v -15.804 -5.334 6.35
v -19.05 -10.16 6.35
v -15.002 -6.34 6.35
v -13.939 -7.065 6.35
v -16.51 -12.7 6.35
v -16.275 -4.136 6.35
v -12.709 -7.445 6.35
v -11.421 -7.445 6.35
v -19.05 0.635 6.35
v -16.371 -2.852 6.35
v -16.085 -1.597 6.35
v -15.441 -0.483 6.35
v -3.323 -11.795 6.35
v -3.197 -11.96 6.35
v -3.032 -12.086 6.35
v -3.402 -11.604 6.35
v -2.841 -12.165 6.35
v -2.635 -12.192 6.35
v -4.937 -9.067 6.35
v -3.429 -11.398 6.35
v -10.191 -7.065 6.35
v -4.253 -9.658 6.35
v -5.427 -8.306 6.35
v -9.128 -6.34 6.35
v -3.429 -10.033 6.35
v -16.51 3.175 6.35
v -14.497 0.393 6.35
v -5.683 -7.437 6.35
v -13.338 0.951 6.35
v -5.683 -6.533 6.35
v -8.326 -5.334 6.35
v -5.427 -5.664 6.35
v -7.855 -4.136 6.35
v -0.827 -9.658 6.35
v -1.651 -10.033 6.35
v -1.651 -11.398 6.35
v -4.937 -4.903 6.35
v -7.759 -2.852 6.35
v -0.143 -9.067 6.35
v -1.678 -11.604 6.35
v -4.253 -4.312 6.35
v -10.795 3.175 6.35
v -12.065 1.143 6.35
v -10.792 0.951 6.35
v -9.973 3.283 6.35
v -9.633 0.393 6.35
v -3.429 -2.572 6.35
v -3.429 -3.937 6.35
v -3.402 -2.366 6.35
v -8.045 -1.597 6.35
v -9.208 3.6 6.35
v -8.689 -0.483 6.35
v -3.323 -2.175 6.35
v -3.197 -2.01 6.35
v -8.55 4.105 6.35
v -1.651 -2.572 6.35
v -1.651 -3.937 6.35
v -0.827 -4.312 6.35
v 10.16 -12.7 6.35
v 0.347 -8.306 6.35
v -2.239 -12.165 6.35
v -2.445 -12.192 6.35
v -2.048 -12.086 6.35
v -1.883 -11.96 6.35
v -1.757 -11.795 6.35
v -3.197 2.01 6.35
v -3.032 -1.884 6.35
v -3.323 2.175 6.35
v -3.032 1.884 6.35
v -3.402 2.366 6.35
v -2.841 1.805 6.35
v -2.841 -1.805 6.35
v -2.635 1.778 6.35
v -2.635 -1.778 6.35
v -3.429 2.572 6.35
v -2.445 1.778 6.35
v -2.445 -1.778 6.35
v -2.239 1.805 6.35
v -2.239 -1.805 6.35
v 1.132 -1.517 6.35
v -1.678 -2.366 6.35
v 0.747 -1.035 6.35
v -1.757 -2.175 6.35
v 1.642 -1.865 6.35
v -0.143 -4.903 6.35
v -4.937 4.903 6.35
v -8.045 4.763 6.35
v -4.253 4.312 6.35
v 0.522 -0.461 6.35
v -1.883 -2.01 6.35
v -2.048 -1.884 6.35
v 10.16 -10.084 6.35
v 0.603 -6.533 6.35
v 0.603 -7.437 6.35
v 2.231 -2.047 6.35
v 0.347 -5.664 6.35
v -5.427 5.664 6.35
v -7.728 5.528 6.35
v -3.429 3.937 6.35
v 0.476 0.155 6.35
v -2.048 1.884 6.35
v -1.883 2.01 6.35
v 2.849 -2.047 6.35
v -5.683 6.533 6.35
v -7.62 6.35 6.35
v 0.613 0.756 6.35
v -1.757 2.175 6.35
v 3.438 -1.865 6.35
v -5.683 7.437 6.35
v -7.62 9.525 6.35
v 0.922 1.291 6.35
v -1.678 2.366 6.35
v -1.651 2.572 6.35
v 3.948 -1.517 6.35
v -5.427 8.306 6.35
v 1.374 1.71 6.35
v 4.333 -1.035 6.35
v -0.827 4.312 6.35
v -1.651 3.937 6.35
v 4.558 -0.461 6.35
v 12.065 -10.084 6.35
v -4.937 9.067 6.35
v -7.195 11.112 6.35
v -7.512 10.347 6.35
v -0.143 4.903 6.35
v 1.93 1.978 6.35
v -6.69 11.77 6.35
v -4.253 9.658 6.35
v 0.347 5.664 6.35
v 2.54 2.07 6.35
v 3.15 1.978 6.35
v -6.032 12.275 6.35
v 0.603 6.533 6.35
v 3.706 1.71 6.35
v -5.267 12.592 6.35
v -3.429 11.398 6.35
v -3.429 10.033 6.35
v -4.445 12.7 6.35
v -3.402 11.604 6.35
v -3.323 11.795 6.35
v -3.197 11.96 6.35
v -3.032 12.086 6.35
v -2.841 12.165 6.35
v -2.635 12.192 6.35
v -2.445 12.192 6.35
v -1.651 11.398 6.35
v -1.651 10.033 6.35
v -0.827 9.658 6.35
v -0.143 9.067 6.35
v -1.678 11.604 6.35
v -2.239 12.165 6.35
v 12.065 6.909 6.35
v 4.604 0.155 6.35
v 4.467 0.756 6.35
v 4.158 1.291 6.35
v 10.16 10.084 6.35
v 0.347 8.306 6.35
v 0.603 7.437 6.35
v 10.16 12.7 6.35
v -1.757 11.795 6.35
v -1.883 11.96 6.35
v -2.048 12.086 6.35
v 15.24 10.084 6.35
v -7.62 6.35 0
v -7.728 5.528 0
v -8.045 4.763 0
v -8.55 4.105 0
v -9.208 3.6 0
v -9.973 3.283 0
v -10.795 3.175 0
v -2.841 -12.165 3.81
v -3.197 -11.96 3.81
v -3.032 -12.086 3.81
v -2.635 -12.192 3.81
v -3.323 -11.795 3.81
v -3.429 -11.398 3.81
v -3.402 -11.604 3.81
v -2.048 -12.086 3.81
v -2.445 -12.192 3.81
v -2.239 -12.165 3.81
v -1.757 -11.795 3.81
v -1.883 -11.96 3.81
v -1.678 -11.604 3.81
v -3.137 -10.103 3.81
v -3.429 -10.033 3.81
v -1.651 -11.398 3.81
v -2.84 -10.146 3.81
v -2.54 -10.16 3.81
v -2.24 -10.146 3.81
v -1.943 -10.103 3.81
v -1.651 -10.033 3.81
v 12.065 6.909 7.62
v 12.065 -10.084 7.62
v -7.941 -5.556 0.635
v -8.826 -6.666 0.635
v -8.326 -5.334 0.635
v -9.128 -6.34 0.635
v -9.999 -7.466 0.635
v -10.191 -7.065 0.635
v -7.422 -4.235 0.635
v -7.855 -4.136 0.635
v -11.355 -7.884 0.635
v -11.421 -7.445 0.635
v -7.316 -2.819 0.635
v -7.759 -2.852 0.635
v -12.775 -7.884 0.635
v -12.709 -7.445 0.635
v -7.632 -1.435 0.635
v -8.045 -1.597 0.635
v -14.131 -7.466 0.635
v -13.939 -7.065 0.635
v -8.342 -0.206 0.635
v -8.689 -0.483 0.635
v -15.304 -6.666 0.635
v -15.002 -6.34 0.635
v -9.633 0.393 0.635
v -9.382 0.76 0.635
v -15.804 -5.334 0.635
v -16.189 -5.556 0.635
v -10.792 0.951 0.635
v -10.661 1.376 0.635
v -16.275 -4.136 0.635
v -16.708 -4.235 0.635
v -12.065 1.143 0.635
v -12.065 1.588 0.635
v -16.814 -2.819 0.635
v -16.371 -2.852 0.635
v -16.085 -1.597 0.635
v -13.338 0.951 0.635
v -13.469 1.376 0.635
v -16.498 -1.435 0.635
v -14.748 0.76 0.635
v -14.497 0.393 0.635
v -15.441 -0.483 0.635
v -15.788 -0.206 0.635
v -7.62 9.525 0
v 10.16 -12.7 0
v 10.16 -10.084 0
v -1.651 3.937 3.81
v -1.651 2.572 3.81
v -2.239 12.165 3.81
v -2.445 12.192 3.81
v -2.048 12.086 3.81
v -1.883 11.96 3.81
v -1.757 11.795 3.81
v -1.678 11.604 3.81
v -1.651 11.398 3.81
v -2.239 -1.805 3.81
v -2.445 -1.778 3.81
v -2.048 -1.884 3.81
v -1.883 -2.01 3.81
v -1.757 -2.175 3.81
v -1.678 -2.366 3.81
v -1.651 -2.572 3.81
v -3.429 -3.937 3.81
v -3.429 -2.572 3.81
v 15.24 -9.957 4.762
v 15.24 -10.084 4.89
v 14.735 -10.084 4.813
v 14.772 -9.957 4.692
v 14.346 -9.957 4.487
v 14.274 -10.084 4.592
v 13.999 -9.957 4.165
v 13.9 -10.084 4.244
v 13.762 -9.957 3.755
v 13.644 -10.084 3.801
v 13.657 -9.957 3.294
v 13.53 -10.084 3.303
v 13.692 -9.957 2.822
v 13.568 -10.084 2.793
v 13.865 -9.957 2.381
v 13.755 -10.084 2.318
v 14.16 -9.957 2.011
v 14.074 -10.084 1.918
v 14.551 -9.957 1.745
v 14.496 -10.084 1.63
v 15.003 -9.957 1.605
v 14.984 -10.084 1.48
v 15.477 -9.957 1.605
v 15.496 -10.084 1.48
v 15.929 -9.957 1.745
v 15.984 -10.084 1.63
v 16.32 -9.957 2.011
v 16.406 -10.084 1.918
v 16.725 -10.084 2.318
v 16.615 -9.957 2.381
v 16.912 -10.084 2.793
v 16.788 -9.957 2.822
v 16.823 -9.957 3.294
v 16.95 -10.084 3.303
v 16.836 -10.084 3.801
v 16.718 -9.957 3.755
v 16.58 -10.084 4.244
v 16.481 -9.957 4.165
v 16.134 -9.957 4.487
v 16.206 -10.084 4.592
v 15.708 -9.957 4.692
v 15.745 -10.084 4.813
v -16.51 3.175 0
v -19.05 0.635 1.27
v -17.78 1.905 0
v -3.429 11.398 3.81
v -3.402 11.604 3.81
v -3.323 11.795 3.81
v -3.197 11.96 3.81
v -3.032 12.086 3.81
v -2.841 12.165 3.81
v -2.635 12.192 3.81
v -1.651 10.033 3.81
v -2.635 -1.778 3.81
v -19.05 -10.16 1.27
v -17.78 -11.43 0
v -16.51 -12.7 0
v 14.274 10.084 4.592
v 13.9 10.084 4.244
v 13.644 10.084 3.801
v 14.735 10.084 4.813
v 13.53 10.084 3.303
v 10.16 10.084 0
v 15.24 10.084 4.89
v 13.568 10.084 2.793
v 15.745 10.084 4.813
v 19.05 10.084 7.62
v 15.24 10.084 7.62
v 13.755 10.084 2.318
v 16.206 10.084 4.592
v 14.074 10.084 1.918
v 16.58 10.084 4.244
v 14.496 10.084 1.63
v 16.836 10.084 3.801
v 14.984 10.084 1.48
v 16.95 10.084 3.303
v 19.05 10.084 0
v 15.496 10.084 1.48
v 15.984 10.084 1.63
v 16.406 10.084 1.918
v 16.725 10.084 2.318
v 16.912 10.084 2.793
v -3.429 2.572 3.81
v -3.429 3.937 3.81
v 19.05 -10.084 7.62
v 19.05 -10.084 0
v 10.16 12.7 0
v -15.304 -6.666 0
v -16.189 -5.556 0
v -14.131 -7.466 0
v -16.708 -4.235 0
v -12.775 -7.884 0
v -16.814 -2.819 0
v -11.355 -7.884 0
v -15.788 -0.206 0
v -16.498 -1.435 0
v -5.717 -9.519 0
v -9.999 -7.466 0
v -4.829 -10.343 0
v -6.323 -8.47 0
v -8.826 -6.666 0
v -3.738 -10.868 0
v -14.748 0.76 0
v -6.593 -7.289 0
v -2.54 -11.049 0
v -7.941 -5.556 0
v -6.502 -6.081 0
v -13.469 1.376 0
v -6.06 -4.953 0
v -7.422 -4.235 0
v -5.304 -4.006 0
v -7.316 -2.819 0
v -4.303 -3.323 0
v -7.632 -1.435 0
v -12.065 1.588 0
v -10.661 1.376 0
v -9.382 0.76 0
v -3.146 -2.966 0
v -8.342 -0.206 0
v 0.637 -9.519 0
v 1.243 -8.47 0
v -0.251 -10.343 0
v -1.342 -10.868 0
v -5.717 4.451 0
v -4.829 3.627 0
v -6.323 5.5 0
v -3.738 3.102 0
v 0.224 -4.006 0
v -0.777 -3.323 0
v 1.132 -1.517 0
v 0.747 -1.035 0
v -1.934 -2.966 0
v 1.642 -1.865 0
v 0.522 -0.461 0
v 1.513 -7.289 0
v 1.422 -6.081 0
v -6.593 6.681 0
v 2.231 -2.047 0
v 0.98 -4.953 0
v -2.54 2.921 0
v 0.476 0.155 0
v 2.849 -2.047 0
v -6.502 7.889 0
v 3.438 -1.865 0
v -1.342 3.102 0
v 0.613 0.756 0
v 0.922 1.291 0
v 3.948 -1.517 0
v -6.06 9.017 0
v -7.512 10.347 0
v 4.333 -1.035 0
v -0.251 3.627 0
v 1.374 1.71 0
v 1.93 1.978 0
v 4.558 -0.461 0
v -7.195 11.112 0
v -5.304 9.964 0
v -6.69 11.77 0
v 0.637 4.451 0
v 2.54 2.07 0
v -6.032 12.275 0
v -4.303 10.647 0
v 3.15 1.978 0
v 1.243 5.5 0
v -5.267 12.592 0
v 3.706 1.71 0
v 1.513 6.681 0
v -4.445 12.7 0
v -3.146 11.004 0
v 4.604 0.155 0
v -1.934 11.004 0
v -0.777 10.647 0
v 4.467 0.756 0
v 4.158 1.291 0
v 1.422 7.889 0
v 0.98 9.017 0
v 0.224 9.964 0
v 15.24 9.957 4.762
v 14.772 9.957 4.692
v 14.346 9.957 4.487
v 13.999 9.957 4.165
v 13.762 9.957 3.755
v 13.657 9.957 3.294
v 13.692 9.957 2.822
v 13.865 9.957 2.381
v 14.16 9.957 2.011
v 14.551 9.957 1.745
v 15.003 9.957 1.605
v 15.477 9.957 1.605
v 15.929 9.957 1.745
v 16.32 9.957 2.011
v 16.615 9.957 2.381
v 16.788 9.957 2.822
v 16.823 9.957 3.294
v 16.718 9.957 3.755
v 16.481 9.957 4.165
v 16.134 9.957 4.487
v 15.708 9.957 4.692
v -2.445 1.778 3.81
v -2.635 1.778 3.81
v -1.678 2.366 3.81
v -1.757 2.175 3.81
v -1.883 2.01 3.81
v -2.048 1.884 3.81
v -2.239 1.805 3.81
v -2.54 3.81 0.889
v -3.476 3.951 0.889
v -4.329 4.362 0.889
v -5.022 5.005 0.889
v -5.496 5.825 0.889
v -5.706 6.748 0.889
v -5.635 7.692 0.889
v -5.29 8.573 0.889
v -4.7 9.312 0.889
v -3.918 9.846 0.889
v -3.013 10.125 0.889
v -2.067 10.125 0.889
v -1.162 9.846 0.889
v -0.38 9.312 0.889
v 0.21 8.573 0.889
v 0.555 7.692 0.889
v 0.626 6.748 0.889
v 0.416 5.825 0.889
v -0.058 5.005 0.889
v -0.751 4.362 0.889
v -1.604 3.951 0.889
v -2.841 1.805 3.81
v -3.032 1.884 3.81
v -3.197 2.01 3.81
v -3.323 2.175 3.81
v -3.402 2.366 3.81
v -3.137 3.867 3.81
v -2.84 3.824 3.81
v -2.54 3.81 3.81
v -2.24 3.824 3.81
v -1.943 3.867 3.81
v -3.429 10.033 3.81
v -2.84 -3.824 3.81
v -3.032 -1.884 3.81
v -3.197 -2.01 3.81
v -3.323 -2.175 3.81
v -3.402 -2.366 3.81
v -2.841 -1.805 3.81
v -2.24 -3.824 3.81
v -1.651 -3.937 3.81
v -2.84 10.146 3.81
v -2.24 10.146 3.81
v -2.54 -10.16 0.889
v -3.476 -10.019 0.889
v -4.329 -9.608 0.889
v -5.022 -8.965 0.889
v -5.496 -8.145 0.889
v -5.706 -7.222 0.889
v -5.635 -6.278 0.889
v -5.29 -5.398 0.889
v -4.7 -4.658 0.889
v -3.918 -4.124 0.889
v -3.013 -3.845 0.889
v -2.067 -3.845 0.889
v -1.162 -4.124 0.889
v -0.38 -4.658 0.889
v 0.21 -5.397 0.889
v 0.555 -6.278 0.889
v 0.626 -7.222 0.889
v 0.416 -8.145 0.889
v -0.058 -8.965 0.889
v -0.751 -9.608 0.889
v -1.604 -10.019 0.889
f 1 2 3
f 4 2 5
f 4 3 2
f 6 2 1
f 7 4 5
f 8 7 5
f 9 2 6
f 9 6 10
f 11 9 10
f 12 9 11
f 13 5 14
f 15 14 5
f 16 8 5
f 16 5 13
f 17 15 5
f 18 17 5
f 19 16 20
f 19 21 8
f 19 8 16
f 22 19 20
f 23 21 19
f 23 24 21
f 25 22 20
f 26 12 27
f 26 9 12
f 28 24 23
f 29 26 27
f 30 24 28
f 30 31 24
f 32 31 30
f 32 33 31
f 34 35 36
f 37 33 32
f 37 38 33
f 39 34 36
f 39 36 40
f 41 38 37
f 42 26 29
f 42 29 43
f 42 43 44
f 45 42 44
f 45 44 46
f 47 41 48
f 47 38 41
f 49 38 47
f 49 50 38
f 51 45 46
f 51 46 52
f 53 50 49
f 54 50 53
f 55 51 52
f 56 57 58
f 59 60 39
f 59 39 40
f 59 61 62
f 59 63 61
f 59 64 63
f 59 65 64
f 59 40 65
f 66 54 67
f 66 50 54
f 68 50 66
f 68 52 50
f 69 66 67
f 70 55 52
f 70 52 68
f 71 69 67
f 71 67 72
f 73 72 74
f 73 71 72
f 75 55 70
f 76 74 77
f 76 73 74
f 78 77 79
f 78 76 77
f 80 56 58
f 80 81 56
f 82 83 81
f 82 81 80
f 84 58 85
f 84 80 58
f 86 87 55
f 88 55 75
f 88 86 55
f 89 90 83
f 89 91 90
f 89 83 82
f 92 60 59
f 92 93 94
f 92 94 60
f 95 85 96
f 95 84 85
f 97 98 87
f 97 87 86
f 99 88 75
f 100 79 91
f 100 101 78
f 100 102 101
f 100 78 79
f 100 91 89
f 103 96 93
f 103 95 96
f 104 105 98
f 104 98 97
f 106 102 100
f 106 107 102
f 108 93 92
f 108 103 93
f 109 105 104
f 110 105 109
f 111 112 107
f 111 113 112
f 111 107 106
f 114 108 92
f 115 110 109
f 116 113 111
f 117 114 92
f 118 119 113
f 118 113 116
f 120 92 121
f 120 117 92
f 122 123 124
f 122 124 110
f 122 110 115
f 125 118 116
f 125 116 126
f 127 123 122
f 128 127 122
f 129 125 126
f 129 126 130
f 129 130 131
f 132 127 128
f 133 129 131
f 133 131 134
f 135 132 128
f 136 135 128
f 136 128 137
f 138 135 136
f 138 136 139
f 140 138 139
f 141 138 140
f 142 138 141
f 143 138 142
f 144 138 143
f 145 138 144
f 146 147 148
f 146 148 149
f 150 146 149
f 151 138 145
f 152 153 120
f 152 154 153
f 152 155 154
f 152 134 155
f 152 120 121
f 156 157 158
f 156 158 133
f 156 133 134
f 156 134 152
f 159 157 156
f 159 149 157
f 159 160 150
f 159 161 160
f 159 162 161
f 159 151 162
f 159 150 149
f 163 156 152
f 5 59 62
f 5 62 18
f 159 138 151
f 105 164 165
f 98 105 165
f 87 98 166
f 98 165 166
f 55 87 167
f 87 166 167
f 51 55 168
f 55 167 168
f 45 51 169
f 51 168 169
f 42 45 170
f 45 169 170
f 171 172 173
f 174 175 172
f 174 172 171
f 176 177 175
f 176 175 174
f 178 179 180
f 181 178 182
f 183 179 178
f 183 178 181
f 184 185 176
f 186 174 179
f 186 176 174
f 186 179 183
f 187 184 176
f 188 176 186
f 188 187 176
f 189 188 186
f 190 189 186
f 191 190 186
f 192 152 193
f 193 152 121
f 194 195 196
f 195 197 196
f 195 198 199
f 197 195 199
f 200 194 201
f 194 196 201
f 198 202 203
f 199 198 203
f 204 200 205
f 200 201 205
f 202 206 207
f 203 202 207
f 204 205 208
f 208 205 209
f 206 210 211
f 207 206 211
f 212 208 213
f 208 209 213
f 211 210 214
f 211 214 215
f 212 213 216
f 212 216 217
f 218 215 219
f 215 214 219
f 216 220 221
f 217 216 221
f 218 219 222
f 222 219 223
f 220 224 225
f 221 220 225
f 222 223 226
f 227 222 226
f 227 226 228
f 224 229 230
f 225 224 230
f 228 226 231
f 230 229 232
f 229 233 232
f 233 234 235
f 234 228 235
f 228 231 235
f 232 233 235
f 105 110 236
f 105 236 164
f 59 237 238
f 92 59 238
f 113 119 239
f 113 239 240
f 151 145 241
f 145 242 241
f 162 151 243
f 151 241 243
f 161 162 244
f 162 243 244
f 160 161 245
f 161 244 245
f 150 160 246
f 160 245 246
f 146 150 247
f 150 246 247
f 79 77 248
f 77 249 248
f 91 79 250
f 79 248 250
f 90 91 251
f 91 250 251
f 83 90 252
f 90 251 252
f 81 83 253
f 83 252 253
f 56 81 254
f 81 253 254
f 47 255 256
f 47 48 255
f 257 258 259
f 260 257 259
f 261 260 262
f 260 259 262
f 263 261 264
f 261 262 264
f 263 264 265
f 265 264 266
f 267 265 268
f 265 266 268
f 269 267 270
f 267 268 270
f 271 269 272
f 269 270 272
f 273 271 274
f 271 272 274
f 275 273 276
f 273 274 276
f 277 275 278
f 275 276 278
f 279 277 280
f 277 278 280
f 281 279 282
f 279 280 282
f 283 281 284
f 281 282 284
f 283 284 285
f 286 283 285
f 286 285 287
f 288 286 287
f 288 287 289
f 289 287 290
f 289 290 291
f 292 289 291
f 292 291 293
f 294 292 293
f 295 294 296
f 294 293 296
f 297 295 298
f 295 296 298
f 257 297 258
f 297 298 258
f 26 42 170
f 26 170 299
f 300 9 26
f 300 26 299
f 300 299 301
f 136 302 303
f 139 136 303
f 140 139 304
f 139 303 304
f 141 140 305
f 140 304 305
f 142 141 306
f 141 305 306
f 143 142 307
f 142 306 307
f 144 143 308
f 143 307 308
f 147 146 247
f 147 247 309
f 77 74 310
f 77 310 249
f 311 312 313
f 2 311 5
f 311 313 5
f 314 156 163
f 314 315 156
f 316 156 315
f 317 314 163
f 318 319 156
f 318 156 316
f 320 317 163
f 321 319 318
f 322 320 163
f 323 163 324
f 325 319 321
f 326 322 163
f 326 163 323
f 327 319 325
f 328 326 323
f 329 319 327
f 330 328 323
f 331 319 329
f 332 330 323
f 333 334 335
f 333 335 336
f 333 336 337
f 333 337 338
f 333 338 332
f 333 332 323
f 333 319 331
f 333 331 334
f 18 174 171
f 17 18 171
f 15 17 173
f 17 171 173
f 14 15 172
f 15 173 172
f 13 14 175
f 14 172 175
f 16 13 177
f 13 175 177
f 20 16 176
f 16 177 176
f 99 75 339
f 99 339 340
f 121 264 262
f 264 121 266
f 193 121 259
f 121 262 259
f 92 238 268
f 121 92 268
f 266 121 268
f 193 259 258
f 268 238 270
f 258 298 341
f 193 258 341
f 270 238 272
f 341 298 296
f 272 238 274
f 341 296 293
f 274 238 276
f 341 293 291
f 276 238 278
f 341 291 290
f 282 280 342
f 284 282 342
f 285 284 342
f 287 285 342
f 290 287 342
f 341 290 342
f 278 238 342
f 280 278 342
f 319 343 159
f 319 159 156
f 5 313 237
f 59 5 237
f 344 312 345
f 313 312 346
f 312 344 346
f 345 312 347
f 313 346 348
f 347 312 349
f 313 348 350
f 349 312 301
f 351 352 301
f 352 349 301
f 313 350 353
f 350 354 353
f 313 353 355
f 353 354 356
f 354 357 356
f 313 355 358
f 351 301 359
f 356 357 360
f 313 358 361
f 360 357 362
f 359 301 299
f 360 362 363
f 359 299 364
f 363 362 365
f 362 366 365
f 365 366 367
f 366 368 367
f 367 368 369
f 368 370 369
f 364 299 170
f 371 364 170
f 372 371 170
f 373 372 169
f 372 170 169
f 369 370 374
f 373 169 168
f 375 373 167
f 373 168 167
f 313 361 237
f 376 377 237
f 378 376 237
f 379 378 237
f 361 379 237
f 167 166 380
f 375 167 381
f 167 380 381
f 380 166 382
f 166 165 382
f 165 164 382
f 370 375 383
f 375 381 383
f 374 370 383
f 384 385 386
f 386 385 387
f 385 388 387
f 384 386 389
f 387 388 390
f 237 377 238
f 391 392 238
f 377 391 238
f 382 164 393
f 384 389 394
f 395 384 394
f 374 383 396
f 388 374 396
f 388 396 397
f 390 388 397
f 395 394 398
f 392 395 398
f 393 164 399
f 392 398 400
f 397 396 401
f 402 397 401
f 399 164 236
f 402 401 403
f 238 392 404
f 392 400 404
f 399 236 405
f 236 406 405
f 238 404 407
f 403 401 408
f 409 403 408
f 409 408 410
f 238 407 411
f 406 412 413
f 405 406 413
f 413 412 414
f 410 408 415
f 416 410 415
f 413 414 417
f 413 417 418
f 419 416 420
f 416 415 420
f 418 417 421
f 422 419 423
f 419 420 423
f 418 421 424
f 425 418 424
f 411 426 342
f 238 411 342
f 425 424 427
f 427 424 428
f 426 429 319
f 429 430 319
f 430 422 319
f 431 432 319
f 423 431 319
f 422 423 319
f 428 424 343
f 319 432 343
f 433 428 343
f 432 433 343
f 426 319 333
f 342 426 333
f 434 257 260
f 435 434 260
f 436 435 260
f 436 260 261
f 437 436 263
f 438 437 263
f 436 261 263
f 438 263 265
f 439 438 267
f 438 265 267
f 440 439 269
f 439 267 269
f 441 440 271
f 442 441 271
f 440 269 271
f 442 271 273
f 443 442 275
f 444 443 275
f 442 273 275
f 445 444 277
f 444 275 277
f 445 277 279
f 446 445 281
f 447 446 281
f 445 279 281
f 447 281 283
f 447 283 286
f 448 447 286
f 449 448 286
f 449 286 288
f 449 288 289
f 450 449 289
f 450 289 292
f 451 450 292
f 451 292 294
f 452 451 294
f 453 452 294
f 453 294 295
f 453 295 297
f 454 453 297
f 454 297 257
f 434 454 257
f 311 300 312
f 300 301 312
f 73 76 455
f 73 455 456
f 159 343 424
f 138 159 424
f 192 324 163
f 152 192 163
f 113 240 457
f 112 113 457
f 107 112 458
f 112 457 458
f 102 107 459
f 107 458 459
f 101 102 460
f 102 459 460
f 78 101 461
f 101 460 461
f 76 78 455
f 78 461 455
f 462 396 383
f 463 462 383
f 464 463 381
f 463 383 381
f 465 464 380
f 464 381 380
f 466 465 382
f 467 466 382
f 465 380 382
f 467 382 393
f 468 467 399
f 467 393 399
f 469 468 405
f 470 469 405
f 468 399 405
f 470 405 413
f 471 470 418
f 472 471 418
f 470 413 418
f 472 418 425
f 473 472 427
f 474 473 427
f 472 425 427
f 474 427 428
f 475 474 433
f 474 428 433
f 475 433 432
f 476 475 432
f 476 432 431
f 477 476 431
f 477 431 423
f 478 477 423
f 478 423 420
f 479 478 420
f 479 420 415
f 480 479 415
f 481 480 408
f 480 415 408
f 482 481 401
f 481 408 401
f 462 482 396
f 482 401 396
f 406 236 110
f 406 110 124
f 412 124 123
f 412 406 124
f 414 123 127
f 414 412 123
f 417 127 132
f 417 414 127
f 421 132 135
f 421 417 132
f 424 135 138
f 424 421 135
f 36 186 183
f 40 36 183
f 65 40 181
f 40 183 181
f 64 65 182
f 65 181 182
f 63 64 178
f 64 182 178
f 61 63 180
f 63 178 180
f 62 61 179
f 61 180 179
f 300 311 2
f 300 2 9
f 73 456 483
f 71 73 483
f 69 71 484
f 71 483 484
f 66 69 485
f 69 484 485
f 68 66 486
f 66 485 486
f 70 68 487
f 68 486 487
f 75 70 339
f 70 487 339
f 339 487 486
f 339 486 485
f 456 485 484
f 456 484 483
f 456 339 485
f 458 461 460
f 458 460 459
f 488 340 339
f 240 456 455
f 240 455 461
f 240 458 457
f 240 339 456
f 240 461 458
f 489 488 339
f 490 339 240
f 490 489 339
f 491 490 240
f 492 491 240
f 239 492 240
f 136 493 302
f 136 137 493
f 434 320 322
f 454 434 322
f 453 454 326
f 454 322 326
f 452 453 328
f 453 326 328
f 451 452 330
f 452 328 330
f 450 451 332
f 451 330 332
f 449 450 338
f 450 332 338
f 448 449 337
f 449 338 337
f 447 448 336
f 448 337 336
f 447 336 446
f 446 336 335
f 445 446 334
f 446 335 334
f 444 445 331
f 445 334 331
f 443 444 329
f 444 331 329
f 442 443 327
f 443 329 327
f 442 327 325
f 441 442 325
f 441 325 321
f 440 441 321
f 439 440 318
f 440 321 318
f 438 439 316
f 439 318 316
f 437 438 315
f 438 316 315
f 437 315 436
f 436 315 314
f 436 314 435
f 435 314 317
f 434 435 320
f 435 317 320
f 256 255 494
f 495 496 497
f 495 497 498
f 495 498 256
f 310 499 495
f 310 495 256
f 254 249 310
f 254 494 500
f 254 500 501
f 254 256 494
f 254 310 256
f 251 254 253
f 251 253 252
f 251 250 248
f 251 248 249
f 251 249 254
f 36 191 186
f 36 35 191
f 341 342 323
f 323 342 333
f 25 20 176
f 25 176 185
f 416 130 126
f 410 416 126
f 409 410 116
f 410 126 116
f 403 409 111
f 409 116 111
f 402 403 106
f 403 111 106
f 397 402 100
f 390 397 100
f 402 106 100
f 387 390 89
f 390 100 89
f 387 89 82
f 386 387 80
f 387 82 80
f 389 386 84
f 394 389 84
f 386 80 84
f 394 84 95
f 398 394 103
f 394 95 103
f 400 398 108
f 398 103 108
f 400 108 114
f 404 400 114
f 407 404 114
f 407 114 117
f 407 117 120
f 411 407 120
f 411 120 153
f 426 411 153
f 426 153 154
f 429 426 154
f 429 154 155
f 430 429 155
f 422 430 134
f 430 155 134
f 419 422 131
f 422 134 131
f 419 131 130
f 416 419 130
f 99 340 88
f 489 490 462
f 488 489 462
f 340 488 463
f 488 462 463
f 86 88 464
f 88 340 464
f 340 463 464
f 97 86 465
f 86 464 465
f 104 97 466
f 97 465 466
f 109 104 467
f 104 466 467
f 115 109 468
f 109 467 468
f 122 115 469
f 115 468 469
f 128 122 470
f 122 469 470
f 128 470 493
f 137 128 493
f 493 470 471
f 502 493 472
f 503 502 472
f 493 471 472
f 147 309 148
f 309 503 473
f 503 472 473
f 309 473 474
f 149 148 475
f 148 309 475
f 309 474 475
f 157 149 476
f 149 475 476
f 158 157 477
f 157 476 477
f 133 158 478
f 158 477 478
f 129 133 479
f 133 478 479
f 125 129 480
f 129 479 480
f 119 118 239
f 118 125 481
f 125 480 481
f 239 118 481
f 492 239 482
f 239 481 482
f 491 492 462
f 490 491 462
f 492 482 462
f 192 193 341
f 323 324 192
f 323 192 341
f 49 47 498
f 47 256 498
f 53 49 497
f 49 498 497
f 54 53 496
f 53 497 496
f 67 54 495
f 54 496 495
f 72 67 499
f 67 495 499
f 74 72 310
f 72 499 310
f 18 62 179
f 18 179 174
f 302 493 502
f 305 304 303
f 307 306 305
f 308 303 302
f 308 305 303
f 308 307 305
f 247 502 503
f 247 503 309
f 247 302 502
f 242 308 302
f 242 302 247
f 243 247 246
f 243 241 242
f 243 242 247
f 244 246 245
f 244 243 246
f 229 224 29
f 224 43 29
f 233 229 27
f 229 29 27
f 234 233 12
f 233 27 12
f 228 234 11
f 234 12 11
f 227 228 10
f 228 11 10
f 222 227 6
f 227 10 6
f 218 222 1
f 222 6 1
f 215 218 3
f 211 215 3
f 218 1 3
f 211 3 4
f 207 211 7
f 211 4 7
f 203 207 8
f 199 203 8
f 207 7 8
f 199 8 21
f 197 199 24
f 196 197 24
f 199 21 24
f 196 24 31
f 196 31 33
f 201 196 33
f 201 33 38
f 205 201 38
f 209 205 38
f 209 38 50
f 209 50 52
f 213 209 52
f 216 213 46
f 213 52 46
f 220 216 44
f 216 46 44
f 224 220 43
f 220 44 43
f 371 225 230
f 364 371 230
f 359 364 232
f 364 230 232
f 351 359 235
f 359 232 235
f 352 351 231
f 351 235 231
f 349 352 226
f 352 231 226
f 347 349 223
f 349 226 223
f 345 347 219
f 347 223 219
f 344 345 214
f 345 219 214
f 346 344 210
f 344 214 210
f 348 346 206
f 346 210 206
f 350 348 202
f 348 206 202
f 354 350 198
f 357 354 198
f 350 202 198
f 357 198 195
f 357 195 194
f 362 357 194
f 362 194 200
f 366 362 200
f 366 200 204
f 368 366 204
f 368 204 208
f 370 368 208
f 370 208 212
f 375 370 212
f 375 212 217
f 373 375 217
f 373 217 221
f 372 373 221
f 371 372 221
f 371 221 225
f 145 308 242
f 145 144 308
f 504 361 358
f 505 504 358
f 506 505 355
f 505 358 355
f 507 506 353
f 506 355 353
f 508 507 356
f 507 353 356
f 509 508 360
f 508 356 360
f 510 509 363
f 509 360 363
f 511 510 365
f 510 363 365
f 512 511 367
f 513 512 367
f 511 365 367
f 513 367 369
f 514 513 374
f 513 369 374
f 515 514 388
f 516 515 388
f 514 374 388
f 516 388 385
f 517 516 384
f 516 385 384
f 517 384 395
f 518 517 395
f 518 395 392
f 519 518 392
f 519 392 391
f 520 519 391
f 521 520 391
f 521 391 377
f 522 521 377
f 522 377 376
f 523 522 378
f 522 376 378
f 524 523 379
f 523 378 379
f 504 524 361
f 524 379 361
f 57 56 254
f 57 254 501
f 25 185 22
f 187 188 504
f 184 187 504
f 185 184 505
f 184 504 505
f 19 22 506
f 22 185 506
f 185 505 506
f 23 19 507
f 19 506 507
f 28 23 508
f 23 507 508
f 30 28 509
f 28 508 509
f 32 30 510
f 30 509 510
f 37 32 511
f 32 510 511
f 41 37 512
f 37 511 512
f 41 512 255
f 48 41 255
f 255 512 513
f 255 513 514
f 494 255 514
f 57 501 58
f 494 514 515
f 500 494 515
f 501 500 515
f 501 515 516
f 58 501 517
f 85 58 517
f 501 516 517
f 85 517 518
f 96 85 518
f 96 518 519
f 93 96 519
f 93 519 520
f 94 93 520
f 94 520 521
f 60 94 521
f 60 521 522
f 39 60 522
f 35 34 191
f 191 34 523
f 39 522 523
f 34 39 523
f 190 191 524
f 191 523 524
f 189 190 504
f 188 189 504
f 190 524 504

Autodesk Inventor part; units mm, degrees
ref_plane "YZ Plane" through (0, 0, 0) normal (1, 0, 0) x (0, 1, 0)
ref_plane "XZ Plane" through (0, 0, 0) normal (0, 1, 0) x (-1, 0, 0)
ref_plane "XY Plane" through (0, 0, 0) normal (0, 0, 1) x (1, 0, 0)
sketch "Sketch1" plane through (0, 0, 0) normal (0, 0, 1) x (1, 0, 0)
  line L0 (0, 17.78) -> (0, -17.78) projected
  line L1 (-26.67, 0) -> (26.67, 0) projected
  line L2 (19.05, -12.7) -> (-19.05, -12.7)
  line L3 (-19.05, -12.7) -> (-19.05, 12.7)
  line L4 (-19.05, 12.7) -> (19.05, 12.7)
  line L5 (19.05, 12.7) -> (19.05, -12.7)
  line L6 (19.05, -12.7) -> (-19.05, 12.7) construction
  line L7 (-19.05, -12.7) -> (19.05, 12.7) construction
  point P0 (0, 0)
  dimension "d0" = 25.4
  dimension "d1" = 38.1
extrude "Extrusion1" add sketch "Sketch1" along normal blind 6.35
sketch "Sketch2" plane through (0, 0, 0) normal (0, 0, 1) x (1, 0, 0)
  line L0 (0, 4.445) -> (0, -4.445) projected
  line L1 (-14.986, 0) -> (5.461, 0) projected
  point P0 (0, 0)
  point P1 (2.54, 0)
  point P2 (-12.065, -3.175)
  dimension "d27" = 12.065
  dimension "d35" = 2.54
  dimension "d48" = 3.175
  dimension "d54" = 0
hole "Hole1" at (2.54, 0, 0) direction (0, 0, 1) diameter 4.1402 end through all
sketch "Sketch4" plane through (-19.05, 12.7, 6.35) normal (0, 1, 0) x (1, 0, 0)
  line L0 (19.05, 15.24) -> (19.05, -2.54) projected
  line L1 (45.72, 6.35) -> (-7.62, 6.35) projected
  line L2 (38.1, 6.35) -> (38.1, 0) projected
  line L3 (38.1, 0) -> (0, 0) projected
  point P0 (19.05, 6.35)
  point P1 (34.29, 3.175)
  point P2 (38.1, 12.7)
  dimension "d36" = 3.81
  dimension "d37" = 3.175
hole "Hole2" at (15.24, 12.7, 3.175) direction (0, -1, 0) diameter 3.175 end through all
hole "Hole3" at (-12.065, -3.175, 0) direction (0, 0, 1) diameter 8.636 end through all counterbore diameter 9.525 counterbore depth 0.635
sketch "Sketch5" plane through (0, 0, 6.35) normal (0, 0, 1) x (1, 0, 0)
  line L0 (19.05, -12.7) -> (19.05, 12.7) projected
  line L1 (19.05, 12.7) -> (-19.05, 12.7) projected
  line L2 (-19.05, -12.7) -> (19.05, -12.7) projected
  line L3 (19.05, 12.7) -> (12.065, 12.7)
  line L4 (12.065, 12.7) -> (12.065, -12.7)
  line L5 (12.065, -12.7) -> (19.05, -12.7)
  line L6 (19.05, -12.7) -> (19.05, 12.7)
  circle A0 centre (2.54, 0) radius 2.0701 projected
  point P0 (0, 0)
  dimension "d39" = 6.985
  dimension "d40" = 9.525
extrude "Extrusion3" add sketch "Sketch5" along normal blind 1.27 contours L2 L4 L1 L0
sketch "Sketch6" plane through (0, 0, 0) normal (0, 0, 1) x (1, 0, 0)
  line L0 (0, 13.335) -> (0, -13.335) projected
  line L1 (-26.67, 0) -> (26.67, 0) projected
  line L2 (12.065, 12.7) -> (-19.05, 12.7) projected
  line L3 (-19.05, -12.7) -> (12.065, -12.7) projected
  line L4 (19.05, -12.7) -> (19.05, 12.7) projected
  line L5 (19.05, 12.7) -> (10.16, 12.7)
  line L6 (10.16, 12.7) -> (10.16, 10.0838)
  line L7 (10.16, 10.0838) -> (19.05, 10.0838)
  line L8 (19.05, 10.0838) -> (19.05, 12.7)
  line L9 (19.05, -12.7) -> (10.16, -12.7)
  line L10 (10.16, -12.7) -> (10.16, -10.0838)
  line L11 (10.16, -10.0838) -> (19.05, -10.0838)
  line L12 (19.05, -10.0838) -> (19.05, -12.7)
  point P0 (0, 0)
  dimension "d43" = 2.6162
  dimension "d44" = 2.6162
  dimension "d45" = 8.89
extrude "Extrusion4" cut sketch "Sketch6" along normal up to next contours L2 L5 L4 L7 L6 | L10 L11 L4 L9 L3
sketch "Sketch7" plane through (0, 0, 6.35) normal (0, 0, 1) x (1, 0, 0)
  line L0 (-19.05, 12.7) -> (-19.05, -12.7) projected
  line L1 (10.16, 12.7) -> (-19.05, 12.7) projected
  line L2 (-19.05, 12.7) -> (-7.62, 12.7)
  line L3 (-7.62, 12.7) -> (-7.62, 3.175)
  line L4 (-7.62, 3.175) -> (-19.05, 3.175)
  line L5 (-19.05, 3.175) -> (-19.05, 12.7)
  point P0 (0, 0)
  dimension "d49" = 9.525
  dimension "d50" = 11.43
extrude "Extrusion5" cut sketch "Sketch7" against normal up to next
fillet "Fillet2" radius 3.175 1 edges at (-7.62, 3.175, 3.175)
chamfer "Chamfer1" distance 2.54 angle 45 1 edges at (-19.05, 3.175, 3.175)
chamfer "Chamfer2" distance 2.54 angle 45 1 edges at (-19.05, -12.7, 3.175)
chamfer "Chamfer3" distance 3.175 angle 45 1 edges at (12.065, 10.0838, 6.985)
fillet "Fillet3" radius 3.175 1 edges at (-7.62, 12.7, 3.175)
sketch "Sketch8" plane through (0, 0, 6.35) normal (0, 0, 1) x (1, 0, 0)
  line L0 (0, 17.78) -> (0, -17.78) projected
  line L1 (-26.67, 0) -> (26.67, 0) projected
  point P0 (0, 0)
  point P1 (-2.54, 6.985)
  point P2 (-2.54, -6.985)
  dimension "d69" = 13.97
  dimension "d70" = 6.985
  dimension "d71" = 2.54
hole "Hole4" at (-2.54, -6.985, 6.35) at (-2.54, 6.985, 6.35) direction (0, 0, -1) diameter 6.35 end through all
sketch "Sketch9" plane through (0, 0, 6.35) normal (0, 0, 1) x (1, 0, 0)
  circle A0 centre (-2.54, 6.985) radius 3.175 projected
  circle A1 centre (-2.54, -6.985) radius 3.175 projected
  line L0 (-1.651, 1.778) -> (-3.429, 1.778)
  line L1 (-3.429, 1.778) -> (-3.429, 12.192)
  line L2 (-3.429, 12.192) -> (-1.651, 12.192)
  line L3 (-1.651, 12.192) -> (-1.651, 1.778)
  line L4 (-1.651, 1.778) -> (-3.429, 12.192) construction
  line L5 (-3.429, 1.778) -> (-1.651, 12.192) construction
  line L6 (-1.651, -12.192) -> (-3.429, -12.192)
  line L7 (-3.429, -12.192) -> (-3.429, -1.778)
  line L8 (-3.429, -1.778) -> (-1.651, -1.778)
  line L9 (-1.651, -1.778) -> (-1.651, -12.192)
  line L10 (-1.651, -12.192) -> (-3.429, -1.778) construction
  line L11 (-3.429, -12.192) -> (-1.651, -1.778) construction
  point P0 (0, 0)
  dimension "d79" = 10.414
  dimension "d80" = 1.778
  dimension "d81" = 10.414
  dimension "d82" = 1.778
extrude "Extrusion6" cut sketch "Sketch9" against normal blind 2.54 contours L3 A0 L1 | A0 L1 L2 L3 | L3 L0 L1 A0 | L9 A1 L7 | A1 L7 L8 L9 | L9 L6 L7 A1
fillet "Fillet4" radius 0.7937 8 edges at (-1.651, -12.192, 5.08) (-3.429, -12.192, 5.08) (-1.651, -1.778, 5.08) (-3.429, -1.778, 5.08) (-1.651, 1.778, 5.08) (-3.429, 1.778, 5.08) (-1.651, 12.192, 5.08) (-3.429, 12.192, 5.08)
chamfer "Chamfer4" distance 1.27 angle 45 1 edges at (-19.05, -4.7625, 0)
chamfer "Chamfer5" distance 0.889 angle 45 2 edges at (-2.54, -3.81, 0) (-2.54, 10.16, 0)
chamfer "Chamfer6" distance 0.127 angle 45 2 edges at (15.24, -10.0838, 1.5875) (15.24, 10.0838, 1.5875)
equation "\"d44\" = d43"
properties part number "J005822" material "ALUMINUM, 6061-T651"
